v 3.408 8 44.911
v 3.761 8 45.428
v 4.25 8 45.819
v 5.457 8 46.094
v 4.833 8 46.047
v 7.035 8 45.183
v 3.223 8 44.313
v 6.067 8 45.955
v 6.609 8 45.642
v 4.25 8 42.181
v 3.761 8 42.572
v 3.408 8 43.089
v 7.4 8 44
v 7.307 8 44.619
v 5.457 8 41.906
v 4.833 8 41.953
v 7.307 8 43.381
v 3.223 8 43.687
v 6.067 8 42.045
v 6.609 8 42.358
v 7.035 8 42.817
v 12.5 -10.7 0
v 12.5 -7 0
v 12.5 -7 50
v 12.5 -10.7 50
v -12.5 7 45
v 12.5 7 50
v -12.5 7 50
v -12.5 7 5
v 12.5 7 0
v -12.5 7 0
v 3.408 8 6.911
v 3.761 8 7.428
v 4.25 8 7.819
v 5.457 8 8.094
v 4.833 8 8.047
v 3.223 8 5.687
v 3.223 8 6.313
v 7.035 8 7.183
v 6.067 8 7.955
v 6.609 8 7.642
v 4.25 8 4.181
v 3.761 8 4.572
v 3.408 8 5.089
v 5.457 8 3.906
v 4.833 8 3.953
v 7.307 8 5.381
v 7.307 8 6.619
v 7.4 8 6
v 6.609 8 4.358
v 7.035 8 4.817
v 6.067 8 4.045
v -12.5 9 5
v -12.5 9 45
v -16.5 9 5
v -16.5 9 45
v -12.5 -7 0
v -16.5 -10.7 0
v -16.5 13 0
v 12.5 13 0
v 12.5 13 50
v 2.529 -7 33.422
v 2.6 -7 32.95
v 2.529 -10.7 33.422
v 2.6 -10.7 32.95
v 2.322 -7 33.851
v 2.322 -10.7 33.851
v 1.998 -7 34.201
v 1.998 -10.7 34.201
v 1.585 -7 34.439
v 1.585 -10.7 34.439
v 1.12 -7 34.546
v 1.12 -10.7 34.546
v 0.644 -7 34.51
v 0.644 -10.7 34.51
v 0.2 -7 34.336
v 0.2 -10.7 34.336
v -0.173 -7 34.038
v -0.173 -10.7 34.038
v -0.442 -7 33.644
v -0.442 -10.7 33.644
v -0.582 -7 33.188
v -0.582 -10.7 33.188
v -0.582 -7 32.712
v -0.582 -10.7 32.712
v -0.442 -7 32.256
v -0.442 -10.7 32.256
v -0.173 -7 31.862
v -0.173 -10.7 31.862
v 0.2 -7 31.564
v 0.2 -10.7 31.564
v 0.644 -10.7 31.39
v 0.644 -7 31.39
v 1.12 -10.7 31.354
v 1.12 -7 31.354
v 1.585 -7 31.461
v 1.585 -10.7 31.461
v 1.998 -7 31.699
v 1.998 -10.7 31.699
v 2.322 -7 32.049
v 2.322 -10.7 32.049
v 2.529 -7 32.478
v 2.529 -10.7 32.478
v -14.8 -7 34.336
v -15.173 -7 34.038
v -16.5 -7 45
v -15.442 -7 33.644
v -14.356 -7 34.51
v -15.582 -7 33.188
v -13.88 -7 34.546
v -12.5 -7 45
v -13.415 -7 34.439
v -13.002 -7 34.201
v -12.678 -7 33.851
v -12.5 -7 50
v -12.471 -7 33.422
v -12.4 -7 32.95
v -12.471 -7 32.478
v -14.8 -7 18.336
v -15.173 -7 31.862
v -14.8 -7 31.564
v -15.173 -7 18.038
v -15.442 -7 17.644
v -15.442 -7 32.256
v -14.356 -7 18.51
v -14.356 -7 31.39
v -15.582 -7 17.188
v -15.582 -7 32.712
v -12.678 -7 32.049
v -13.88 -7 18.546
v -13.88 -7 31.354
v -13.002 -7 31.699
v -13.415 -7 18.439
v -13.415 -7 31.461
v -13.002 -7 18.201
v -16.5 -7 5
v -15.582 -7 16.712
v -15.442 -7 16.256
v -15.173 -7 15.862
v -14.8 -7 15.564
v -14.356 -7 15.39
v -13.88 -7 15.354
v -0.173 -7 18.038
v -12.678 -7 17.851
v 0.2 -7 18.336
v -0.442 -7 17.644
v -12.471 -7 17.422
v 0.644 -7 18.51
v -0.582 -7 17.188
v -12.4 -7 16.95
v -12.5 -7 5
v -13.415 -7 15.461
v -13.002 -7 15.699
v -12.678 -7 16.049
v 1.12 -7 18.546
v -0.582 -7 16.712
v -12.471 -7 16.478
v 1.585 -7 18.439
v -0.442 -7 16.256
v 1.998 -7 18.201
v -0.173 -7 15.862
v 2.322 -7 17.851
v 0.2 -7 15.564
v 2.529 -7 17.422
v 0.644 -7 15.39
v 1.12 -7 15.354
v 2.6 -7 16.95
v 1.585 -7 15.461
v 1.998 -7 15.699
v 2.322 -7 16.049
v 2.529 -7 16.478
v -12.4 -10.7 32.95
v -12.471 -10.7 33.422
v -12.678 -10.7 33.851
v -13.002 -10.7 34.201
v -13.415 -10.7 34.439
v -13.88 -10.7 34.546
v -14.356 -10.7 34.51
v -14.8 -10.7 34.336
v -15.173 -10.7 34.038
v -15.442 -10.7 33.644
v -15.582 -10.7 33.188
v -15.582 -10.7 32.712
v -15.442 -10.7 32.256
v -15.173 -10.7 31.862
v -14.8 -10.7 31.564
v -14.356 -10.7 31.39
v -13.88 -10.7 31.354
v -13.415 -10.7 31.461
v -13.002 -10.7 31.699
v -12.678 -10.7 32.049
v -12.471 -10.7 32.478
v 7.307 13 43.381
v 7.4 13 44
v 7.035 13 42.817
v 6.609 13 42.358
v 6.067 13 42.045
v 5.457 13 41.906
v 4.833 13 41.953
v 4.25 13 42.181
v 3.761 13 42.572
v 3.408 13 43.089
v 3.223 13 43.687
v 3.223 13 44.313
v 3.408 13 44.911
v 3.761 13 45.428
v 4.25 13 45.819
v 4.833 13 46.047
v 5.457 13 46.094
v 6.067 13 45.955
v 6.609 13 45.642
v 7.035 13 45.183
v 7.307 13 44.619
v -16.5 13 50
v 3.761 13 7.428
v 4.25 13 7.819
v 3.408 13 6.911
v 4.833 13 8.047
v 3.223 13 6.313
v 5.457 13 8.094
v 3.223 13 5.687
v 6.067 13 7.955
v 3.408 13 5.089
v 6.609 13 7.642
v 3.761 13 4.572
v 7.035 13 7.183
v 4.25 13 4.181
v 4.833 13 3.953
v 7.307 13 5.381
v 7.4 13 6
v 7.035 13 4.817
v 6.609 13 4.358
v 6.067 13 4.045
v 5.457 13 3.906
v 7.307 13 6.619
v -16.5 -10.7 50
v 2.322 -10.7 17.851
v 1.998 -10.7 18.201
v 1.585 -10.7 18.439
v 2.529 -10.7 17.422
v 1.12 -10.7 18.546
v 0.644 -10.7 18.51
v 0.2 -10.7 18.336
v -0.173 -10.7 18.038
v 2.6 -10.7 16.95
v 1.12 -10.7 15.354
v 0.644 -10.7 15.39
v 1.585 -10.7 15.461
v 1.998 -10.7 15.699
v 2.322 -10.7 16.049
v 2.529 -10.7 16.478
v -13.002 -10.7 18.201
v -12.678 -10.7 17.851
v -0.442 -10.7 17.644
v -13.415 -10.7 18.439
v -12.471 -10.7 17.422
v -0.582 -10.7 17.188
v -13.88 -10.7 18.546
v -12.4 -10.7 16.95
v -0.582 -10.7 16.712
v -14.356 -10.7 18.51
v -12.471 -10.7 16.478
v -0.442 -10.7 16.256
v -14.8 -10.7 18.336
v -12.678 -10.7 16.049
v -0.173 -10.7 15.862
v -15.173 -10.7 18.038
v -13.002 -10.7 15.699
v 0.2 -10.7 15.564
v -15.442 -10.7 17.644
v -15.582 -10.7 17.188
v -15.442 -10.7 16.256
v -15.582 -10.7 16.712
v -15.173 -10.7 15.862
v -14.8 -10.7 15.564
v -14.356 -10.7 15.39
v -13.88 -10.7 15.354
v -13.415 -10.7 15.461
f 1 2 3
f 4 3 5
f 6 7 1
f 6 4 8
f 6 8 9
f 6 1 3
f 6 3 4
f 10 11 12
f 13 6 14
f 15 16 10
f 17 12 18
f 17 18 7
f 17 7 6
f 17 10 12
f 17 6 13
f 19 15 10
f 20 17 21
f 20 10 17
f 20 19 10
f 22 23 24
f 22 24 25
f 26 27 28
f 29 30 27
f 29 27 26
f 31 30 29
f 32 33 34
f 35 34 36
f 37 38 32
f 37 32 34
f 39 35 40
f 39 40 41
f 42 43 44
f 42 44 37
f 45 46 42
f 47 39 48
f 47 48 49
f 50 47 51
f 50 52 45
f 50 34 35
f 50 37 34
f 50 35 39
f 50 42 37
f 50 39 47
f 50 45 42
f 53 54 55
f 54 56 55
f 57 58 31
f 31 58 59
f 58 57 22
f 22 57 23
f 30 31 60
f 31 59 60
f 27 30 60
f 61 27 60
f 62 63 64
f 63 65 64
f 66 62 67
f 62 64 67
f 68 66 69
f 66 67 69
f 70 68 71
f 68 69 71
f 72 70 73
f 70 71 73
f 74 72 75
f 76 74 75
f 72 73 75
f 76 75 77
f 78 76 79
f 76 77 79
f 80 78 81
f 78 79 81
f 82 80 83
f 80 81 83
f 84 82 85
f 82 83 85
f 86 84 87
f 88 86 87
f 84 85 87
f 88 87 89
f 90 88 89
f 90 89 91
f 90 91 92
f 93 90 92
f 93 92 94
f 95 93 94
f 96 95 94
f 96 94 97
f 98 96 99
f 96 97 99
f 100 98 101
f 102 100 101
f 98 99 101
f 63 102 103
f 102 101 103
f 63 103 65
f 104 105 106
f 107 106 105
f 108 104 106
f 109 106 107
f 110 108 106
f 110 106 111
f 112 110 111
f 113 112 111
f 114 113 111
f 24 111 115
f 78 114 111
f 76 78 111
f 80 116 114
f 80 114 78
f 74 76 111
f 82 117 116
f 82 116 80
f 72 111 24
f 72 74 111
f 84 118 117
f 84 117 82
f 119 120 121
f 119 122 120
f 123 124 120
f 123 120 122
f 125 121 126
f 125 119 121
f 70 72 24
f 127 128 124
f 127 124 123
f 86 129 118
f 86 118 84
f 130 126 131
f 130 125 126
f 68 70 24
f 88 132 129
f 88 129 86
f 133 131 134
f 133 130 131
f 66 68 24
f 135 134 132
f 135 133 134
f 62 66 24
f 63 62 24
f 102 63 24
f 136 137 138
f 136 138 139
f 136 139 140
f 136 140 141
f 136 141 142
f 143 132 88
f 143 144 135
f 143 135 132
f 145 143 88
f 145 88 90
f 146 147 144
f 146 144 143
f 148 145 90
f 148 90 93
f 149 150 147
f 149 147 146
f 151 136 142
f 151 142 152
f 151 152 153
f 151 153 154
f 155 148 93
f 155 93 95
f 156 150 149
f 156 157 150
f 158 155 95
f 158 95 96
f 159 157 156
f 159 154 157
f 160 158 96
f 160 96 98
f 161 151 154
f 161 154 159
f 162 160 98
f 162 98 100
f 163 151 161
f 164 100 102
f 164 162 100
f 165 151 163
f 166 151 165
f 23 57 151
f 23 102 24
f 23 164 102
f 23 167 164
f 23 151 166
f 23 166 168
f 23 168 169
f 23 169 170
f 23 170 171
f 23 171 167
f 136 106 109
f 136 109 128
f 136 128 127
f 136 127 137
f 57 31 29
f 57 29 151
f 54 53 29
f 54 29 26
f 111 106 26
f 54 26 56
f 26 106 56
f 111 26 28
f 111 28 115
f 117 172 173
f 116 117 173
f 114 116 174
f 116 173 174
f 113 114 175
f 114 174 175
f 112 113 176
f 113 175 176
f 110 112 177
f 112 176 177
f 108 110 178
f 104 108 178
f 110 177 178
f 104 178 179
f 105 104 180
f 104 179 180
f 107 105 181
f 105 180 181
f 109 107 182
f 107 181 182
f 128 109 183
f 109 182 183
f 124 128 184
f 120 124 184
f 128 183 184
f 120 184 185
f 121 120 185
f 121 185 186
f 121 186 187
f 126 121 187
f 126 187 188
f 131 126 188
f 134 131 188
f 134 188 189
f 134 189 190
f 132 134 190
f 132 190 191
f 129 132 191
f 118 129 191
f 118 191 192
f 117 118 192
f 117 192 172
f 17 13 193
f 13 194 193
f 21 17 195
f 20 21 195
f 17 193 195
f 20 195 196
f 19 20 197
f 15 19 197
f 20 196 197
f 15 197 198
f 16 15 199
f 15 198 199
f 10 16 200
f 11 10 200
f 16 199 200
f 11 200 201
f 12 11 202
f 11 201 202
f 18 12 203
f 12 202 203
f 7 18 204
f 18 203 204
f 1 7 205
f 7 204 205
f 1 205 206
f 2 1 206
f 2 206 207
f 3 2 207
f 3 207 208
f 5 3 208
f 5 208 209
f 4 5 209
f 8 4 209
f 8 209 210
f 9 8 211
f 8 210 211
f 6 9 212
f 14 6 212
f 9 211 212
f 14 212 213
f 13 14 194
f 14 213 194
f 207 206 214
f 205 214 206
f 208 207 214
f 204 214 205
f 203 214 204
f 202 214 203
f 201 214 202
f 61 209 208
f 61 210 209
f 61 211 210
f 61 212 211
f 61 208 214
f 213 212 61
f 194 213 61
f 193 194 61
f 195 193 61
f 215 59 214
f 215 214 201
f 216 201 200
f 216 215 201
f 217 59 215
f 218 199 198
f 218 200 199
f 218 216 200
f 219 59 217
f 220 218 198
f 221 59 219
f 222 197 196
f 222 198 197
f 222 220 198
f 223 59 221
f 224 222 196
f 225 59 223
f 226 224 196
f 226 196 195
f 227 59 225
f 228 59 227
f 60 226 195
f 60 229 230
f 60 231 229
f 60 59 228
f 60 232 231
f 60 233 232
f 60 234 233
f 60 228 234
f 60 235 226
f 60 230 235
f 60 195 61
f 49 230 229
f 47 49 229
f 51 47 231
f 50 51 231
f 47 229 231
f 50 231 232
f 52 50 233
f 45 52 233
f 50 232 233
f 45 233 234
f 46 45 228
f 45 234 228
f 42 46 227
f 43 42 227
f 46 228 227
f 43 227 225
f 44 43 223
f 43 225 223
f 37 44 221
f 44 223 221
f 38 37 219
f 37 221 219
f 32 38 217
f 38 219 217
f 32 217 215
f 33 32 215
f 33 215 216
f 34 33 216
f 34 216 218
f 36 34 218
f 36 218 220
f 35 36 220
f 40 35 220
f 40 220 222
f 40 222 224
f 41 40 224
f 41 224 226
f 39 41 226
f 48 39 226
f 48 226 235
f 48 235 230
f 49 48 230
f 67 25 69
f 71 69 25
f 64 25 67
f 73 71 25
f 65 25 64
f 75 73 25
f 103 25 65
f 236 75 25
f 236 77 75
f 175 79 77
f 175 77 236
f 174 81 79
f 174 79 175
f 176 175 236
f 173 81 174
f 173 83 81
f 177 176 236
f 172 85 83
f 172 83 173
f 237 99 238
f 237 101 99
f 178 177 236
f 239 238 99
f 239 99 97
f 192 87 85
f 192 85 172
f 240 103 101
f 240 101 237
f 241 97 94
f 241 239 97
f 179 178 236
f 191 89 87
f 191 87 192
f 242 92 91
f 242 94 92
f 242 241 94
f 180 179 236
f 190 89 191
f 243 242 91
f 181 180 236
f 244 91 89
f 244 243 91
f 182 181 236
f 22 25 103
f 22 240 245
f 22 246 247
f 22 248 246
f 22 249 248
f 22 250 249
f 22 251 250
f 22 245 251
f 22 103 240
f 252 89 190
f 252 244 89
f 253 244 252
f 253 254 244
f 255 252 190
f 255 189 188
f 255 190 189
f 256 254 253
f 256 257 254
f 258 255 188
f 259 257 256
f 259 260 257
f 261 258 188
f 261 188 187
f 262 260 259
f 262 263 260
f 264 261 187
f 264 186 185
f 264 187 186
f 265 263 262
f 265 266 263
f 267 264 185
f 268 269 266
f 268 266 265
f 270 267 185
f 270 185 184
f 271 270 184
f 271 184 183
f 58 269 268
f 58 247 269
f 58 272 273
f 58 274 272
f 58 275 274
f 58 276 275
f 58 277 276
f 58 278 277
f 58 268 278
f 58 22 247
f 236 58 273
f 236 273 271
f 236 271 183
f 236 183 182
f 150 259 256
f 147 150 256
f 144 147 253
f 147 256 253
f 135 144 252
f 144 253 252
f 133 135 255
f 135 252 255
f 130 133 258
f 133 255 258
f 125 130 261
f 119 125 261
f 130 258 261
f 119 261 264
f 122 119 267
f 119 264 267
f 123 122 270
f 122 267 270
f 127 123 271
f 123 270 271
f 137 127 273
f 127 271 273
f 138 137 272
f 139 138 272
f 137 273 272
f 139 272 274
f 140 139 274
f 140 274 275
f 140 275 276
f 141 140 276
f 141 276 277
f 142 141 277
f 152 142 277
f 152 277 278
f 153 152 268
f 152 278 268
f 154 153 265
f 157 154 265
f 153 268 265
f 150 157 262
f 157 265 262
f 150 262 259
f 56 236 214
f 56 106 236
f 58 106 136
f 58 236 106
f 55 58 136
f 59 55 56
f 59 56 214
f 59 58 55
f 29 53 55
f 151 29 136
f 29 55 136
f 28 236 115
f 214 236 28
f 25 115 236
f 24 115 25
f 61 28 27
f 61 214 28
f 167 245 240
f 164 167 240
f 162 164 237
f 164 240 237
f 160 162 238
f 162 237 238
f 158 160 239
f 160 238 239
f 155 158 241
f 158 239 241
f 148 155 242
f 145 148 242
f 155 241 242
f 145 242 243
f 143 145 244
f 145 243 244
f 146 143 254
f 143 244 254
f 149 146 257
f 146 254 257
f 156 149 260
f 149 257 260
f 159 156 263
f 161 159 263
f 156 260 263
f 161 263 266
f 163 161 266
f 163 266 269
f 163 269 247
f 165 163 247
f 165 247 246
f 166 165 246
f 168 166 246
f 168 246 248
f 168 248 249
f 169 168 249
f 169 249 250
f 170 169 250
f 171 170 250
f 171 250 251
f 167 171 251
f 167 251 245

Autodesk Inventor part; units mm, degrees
ref_plane "YZ Plane" through (0, 0, 0) normal (1, 0, 0) x (0, 1, 0)
ref_plane "XZ Plane" through (0, 0, 0) normal (0, 1, 0) x (-1, 0, 0)
ref_plane "XY Plane" through (0, 0, 0) normal (0, 0, 1) x (1, 0, 0)
sketch "Эскиз1" plane through (0, 0, 0) normal (0, 0, 1) x (1, 0, 0)
  line L0 (12.5, 7) -> (-12.5, 7)
  line L1 (-12.5, 7) -> (-12.5, -7)
  line L2 (-12.5, -7) -> (12.5, -7)
  line L3 (12.5, -7) -> (12.5, 7)
  line L4 (12.5, 7) -> (-12.5, -7) construction
  line L5 (-12.5, 7) -> (12.5, -7) construction
  line L6 (-16.5, 13) -> (12.5, 13)
  line L7 (11.5, 13) -> (11.5, -10.7) construction
  line L8 (11.5, -10.7) -> (12.5, -10.7) construction
  line L9 (-16.5, -10.7) -> (-16.5, 13)
  line L10 (12.5, -7) -> (12.5, -10.7)
  line L11 (12.5, 7) -> (12.5, 13)
  line L12 (12.5, 13) -> (11.5, 13) construction
  line L13 (12.5, -10.7) -> (-16.5, -10.7)
  point P0 (0, 0)
  dimension "d0" = 25
  dimension "d1" = 14
  dimension "d2" = 6
  dimension "d11" = 3.7
extrude "Выдавливание1" add sketch "Эскиз1" along normal blind 50 contours L0 L1 L2 L10 L13 L9 L6 L11
sketch "Эскиз2" plane through (-16.5, -10.7, 0) normal (-1, 0, 0) x (0, 0, 1)
  line L0 (0, 23.7) -> (0, 0) construction
  line L1 (0, 0) -> (50, 0) construction
  line L2 (50, 23.7) -> (50, 0) construction
  line L3 (0, 23.7) -> (50, 23.7) construction
  line L4 (45, 19.7) -> (5, 19.7)
  line L5 (5, 19.7) -> (5, 4)
  line L6 (45, 4) -> (45, 19.7)
  line L7 (45, 19.7) -> (5, 4) construction
  line L8 (5, 19.7) -> (45, 4) construction
  line L9 (0, 23.7) -> (50, 23.7) projected
  line L10 (50, 0) -> (50, 3.7) projected
  line L11 (0, 23.7) -> (50, 0) construction
  line L12 (5, 3.7) -> (45, 3.7)
  line L13 (5, 4) -> (5, 3.7)
  line L14 (0, 3.7) -> (50, 3.7) projected
  line L15 (45, 4) -> (45, 3.7)
  point P0 (0, 10.7)
  point P1 (25, 11.85)
  dimension "d5" = 40
  dimension "d6" = 4
  dimension "d12" = 3.7
extrude "Выдавливание2" cut sketch "Эскиз2" against normal blind 4
sketch "Эскиз4" plane through (-16.5, -10.7, 0) normal (0, -1, 0) x (1, 0, 0)
  circle A0 centre (2.5, 32.95) radius 1.5 construction
  circle A1 centre (2.5, 16.95) radius 1.5 construction
  circle A2 centre (17.5, 32.95) radius 1.5 construction
  circle A3 centre (2.5, 16.95) radius 1.5 construction
  circle A4 centre (17.5, 16.95) radius 1.5 construction
  circle A5 centre (2.5, 32.95) radius 1.6
  circle A6 centre (17.5, 32.95) radius 1.6
  circle A7 centre (17.5, 16.95) radius 1.6
  circle A8 centre (2.5, 16.95) radius 1.6
  dimension "d19" = 3.2
  dimension "d20" = 3.2
  dimension "d21" = 3.2
  dimension "d22" = 3.2
extrude "Выдавливание3" cut sketch "Эскиз4" against normal blind 4
sketch "Эскиз6" plane through (-16.5, 13, 0) normal (0, 1, 0) x (1, 0, 0)
  circle A0 centre (9.8, -9.6796) radius 6 construction
  line L0 (15.8, -9.6796) -> (15.8, -27.7296) construction
  circle A1 centre (21.8, -6) radius 6 construction
  circle A2 centre (21.8, -6) radius 2.1
  line L1 (29, -25) -> (0, -25) construction
  circle A3 centre (21.8, -44) radius 2.1
  dimension "d13" = 12
  dimension "d14" = 12
  dimension "d15" = 4.2
extrude "Выдавливание4" cut sketch "Эскиз6" against normal blind 5
properties part number "креп_центр_ролик"
